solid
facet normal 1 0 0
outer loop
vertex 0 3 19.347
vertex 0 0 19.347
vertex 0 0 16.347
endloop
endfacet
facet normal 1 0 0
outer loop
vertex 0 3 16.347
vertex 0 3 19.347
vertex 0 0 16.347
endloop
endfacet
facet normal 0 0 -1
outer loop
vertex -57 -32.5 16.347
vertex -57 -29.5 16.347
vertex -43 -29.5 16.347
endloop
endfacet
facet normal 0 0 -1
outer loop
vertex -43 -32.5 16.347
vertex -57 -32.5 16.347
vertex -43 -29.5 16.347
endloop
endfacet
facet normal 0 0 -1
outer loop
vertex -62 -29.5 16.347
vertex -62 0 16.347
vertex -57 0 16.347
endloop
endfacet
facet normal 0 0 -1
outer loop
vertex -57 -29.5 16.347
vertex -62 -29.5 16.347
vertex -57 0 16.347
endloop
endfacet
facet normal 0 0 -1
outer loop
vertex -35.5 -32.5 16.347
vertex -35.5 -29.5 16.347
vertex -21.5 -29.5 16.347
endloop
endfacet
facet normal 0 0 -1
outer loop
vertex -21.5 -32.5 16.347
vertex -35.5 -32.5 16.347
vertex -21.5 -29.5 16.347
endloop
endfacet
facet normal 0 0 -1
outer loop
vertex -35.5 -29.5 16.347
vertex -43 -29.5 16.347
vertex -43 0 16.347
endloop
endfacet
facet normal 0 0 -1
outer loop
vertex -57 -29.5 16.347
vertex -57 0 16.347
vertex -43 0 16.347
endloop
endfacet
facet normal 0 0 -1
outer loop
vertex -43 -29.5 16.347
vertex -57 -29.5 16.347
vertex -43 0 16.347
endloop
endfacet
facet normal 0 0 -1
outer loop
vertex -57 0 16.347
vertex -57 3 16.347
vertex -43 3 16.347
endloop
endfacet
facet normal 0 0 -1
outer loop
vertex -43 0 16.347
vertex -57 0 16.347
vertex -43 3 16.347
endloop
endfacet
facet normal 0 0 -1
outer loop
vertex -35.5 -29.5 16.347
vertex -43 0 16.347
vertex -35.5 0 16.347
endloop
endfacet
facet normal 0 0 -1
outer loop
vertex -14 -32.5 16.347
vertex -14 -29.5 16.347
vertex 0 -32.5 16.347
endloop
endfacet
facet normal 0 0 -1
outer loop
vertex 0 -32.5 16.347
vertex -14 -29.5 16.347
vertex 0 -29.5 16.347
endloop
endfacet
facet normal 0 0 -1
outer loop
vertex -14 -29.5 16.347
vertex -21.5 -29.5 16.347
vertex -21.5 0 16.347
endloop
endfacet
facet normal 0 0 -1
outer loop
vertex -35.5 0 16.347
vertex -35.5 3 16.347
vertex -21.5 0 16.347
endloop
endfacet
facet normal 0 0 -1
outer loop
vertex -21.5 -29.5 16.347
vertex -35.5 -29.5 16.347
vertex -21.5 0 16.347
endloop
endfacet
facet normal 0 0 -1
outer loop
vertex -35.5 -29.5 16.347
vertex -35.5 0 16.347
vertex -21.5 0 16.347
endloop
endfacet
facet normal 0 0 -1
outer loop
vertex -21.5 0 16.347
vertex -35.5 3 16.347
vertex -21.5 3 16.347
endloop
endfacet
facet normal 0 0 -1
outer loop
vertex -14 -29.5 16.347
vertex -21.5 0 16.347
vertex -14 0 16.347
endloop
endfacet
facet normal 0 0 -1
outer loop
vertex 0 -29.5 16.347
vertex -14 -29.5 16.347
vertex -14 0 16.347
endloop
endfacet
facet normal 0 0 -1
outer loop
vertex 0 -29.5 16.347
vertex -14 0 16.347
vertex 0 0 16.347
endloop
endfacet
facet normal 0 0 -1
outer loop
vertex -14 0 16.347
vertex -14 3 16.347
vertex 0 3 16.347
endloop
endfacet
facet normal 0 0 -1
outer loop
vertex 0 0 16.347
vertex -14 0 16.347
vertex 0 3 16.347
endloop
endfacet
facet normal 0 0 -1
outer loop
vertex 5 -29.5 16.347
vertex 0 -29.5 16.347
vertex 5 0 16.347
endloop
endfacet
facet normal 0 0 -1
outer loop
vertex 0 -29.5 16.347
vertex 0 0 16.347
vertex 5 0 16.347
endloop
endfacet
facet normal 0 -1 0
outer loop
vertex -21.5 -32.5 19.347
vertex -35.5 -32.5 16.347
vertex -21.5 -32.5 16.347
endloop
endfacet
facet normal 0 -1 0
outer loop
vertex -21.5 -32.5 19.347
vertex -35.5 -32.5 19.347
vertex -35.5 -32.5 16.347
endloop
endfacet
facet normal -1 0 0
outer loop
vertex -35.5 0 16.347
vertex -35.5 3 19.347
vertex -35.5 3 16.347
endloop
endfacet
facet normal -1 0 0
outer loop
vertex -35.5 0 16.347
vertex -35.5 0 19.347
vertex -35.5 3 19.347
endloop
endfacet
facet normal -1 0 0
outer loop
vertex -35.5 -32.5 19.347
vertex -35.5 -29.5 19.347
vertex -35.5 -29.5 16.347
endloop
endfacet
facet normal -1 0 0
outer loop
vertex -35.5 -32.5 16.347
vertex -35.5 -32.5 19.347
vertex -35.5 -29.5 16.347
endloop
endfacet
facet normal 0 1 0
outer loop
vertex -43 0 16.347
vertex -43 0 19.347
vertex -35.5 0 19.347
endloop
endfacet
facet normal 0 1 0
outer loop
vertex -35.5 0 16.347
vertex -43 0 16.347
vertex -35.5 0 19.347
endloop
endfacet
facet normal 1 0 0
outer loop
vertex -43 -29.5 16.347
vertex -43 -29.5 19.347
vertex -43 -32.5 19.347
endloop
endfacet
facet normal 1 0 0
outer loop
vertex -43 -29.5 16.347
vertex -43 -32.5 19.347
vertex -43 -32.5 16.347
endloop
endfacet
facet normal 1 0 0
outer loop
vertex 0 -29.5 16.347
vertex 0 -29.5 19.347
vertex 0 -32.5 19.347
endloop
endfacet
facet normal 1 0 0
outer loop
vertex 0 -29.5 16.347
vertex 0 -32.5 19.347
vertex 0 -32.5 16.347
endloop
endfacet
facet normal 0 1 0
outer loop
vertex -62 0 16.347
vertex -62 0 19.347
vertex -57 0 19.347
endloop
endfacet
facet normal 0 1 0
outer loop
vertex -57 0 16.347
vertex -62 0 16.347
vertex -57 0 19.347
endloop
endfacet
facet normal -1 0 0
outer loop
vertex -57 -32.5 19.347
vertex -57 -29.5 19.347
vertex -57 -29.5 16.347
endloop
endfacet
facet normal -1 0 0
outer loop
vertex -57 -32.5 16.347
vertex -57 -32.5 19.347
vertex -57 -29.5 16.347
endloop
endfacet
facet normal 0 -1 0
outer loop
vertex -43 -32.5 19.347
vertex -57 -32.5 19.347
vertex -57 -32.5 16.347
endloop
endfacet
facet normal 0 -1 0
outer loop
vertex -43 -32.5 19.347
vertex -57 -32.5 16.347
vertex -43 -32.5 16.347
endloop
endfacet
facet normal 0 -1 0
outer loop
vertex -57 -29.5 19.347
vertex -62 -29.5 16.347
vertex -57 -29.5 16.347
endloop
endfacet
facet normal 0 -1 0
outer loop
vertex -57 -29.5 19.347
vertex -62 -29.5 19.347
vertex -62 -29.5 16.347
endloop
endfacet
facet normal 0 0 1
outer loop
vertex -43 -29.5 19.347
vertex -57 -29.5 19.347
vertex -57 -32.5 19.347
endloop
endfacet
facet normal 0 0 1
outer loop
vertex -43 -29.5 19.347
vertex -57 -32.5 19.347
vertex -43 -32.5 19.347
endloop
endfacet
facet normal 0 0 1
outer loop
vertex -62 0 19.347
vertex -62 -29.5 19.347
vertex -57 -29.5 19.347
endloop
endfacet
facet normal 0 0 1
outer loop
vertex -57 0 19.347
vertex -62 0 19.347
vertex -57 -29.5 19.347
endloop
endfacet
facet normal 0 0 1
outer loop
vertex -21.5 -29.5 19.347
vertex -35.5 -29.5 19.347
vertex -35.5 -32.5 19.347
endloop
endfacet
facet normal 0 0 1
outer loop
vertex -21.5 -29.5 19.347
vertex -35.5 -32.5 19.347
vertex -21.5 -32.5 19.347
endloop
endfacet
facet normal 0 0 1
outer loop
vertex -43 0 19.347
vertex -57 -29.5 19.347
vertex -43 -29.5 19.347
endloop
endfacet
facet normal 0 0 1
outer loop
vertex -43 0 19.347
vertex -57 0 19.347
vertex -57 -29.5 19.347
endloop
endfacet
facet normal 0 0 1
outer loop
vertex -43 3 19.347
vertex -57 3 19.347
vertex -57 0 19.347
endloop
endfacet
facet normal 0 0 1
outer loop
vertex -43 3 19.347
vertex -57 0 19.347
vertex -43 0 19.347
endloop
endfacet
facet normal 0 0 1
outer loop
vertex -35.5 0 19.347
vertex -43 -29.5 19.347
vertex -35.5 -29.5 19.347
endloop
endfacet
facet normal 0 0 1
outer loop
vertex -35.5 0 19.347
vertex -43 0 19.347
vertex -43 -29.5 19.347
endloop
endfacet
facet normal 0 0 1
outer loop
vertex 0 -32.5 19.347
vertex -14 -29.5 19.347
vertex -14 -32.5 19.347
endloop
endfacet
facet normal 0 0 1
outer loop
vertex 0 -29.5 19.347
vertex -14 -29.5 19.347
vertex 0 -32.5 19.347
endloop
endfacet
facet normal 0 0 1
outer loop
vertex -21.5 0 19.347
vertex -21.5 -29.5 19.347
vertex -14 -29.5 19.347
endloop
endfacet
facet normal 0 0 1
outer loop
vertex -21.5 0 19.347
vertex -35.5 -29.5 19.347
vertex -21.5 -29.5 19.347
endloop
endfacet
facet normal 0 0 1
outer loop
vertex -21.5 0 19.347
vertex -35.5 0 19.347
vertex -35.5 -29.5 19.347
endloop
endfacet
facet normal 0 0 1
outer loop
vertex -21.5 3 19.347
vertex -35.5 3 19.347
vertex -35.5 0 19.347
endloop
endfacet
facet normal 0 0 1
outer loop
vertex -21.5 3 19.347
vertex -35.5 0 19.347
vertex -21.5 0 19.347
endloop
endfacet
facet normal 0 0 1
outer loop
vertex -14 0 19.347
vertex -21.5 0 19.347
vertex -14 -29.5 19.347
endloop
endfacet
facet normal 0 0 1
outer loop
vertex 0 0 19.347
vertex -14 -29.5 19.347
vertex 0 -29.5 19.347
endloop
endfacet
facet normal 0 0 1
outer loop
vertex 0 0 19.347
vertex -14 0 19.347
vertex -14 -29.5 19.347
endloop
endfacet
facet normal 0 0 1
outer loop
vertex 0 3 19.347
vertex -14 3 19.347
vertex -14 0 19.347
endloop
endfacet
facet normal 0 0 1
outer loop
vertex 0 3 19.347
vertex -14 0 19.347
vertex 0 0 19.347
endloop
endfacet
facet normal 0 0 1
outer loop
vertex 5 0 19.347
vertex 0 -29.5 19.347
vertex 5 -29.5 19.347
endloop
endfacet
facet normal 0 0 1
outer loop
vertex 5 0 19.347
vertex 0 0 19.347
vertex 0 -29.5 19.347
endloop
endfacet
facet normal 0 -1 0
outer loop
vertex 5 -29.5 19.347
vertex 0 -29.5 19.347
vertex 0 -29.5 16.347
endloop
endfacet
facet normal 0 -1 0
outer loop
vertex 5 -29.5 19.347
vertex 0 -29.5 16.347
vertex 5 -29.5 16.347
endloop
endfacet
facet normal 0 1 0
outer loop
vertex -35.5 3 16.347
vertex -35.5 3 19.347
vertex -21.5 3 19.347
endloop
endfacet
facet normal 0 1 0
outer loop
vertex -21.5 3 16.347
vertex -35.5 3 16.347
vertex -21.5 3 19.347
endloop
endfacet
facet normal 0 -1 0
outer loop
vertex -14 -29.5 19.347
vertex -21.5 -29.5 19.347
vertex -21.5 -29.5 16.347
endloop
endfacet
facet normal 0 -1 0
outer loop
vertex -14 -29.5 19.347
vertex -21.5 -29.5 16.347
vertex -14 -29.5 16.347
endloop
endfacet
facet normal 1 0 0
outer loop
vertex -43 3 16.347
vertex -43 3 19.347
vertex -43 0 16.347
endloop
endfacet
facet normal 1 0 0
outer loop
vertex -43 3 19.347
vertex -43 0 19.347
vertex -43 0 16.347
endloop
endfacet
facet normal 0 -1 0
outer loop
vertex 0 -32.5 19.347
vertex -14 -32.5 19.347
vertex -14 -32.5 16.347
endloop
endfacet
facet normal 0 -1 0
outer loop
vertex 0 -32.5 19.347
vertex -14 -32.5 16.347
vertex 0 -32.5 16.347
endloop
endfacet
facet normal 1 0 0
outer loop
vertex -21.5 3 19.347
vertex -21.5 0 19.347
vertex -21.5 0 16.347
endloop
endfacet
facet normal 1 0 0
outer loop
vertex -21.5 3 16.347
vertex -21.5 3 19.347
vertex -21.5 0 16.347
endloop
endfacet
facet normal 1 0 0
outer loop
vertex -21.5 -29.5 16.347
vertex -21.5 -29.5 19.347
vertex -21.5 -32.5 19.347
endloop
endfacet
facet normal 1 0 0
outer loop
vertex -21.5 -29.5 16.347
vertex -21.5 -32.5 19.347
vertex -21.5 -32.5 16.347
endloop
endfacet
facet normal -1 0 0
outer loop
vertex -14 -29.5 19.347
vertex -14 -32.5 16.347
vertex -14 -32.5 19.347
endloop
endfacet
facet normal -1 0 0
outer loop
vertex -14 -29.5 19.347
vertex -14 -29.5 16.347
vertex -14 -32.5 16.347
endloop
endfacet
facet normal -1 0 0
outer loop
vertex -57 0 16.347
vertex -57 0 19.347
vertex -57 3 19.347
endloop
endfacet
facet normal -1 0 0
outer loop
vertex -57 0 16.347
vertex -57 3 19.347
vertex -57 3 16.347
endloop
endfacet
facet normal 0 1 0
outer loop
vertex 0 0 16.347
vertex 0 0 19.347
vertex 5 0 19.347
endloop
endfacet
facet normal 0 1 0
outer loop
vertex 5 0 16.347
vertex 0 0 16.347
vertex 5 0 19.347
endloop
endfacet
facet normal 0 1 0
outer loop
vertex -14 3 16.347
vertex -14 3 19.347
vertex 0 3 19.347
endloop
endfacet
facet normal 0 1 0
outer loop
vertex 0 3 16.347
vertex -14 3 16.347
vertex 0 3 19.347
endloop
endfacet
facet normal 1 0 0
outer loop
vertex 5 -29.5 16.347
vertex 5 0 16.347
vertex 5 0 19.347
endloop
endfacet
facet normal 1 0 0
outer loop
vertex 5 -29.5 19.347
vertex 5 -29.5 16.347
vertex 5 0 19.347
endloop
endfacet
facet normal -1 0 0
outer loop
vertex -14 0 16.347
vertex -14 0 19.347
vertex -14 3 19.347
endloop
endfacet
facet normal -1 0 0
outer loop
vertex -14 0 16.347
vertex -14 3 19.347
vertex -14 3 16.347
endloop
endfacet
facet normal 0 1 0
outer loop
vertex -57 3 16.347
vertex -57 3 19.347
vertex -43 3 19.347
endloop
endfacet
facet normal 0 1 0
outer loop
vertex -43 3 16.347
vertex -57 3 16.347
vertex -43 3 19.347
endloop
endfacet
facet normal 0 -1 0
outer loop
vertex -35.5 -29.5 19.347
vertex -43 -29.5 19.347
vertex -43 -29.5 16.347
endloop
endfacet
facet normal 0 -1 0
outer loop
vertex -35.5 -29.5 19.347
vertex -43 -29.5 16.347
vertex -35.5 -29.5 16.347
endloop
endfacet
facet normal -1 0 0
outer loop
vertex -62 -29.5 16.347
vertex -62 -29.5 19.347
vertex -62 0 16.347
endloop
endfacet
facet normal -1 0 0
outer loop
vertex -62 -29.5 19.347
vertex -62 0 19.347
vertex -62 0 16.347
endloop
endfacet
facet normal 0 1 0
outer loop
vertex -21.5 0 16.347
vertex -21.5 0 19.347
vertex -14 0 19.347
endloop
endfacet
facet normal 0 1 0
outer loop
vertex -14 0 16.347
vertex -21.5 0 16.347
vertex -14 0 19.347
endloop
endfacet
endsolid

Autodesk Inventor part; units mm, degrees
ref_plane "YZ Plane" through (0, 0, 0) normal (1, 0, 0) x (0, 1, 0)
ref_plane "XZ Plane" through (0, 0, 0) normal (0, 1, 0) x (-1, 0, 0)
ref_plane "XY Plane" through (0, 0, 0) normal (0, 0, 1) x (1, 0, 0)
sketch "Boceto1" plane through (0, 0, 0) normal (0, 1, 0) x (-1, 0, 0)
  circle A0 centre (28.5, 0) radius 1.5
  circle A1 centre (28.5, -8) radius 1.5
  circle A2 centre (28.5, 8) radius 1.5
  circle A3 centre (36.5, 0) radius 1.5
  circle A4 centre (20.5, 0) radius 1.5
  circle A5 centre (28.5, 0) radius 47.5
  line L0 (57, 33) -> (43, 33)
  line L1 (43, 33) -> (43, 30)
  line L2 (35.5, 30) -> (35.5, 33)
  line L3 (35.5, 33) -> (21.5, 33)
  line L4 (21.5, 33) -> (21.5, 30)
  line L5 (14, 30) -> (14, 33)
  line L6 (14, 33) -> (0, 33)
  line L7 (43, 30) -> (57, 30)
  line L8 (21.5, 30) -> (35.5, 30)
  line L9 (14, 30) -> (0, 30)
  line L10 (0, 30) -> (0, 33)
  line L11 (57, 33) -> (57, 30)
  line L12 (35.5, -30) -> (35.5, -33)
  line L13 (21.5, -30) -> (35.5, -30)
  line L14 (35.5, -33) -> (21.5, -33)
  line L15 (21.5, -33) -> (21.5, -30)
  line L16 (57, -33) -> (43, -33)
  line L17 (43, -33) -> (43, -30)
  line L18 (43, -30) -> (57, -30)
  line L19 (14, -30) -> (14, -33)
  line L20 (14, -30) -> (0, -30)
  line L21 (14, -33) -> (0, -33)
  line L22 (0, -30) -> (0, -33)
  line L23 (57, -33) -> (57, -30)
extrude "Extrusión1" add sketch "Boceto1" along normal blind 3
sketch "Boceto2" plane through (-28.5, 0, 0) normal (0, -1, 0) x (1, 0, 0)
  circle A0 centre (0, 0) radius 3.5
  point P0 (28.5, 0)
  dimension "d23" = 7
extrude "Extrusión2" cut sketch "Boceto2" against normal blind 10
sketch "Boceto3" plane through (-28.5, 0, 0) normal (0, -1, 0) x (1, 0, 0)
  circle A0 centre (0, 0) radius 4.5
  point P0 (28.5, 0)
  dimension "d26" = 9
extrude "Extrusión3" cut sketch "Boceto3" against normal blind 10
sketch "Boceto4" plane through (-28.5, 0, 0) normal (0, -1, 0) x (1, 0, 0)
  circle A0 centre (0, 0) radius 4.5 projected
  arc A1 (-38.8091, 27.388) -> (38.8091, 27.388) centre (0, 0) ccw
  line L0 (-28.5, 30) -> (-28.5, 33) projected
  line L1 (-28.5, 30) -> (-28.5, 33)
  line L2 (-28.5, 33) -> (28.5, 33)
  line L3 (28.5, 33) -> (28.5, 30)
  line L4 (-14.5, 30) -> (-28.5, 30) projected
  line L5 (28.5, 30) -> (-28.5, 30)
  line L6 (-28.5, 33) -> (-31.5138, 33)
  line L7 (-31.5138, 33) -> (-31.5138, 30)
  line L8 (-31.5138, 30) -> (-28.5, 30)
  circle A2 centre (0, 0) radius 47.5 projected
  line L9 (38.8091, 27.388) -> (-38.8091, 27.388)
  point P0 (28.5, 0)
extrude "Extrusión4" cut sketch "Boceto4" against normal blind 10 contours L9 A1
sketch "Boceto5" plane through (0, 0, 0) normal (0, -1, 0) x (1, 0, 0)
  arc A0 (10.3091, 27.388) -> (-67.3091, 27.388) centre (-28.5, 0) ccw projected
  arc A1 (10.3091, 27.388) -> (-67.3091, 27.388) centre (-28.5, 0) ccw
  line L0 (-57, 19.347) -> (-43, 19.347)
  line L1 (0, 19.347) -> (-14, 19.347)
  line L2 (-14, 19.347) -> (-14, 16.347)
  line L3 (-21.5, 16.347) -> (-35.5, 16.347)
  line L4 (-43, 16.347) -> (-57, 16.347)
  line L5 (-57, 19.347) -> (-57, 16.347)
  line L6 (-43, 19.347) -> (-43, 16.347)
  line L7 (-35.5, 19.347) -> (-35.5, 16.347)
  line L8 (-21.5, 19.347) -> (-21.5, 16.347)
  line L9 (-14, 16.347) -> (0, 16.347)
  line L10 (0, 19.347) -> (0, 16.347)
  line L11 (-35.5, 19.347) -> (-21.5, 19.347)
  point P0 (0, 0)
  point P1 (-57, 30)
  point P2 (-21.5, 30)
  point P3 (0, 30)
extrude "Extrusión5" add sketch "Boceto5" against normal blind 3
sketch "Boceto6" plane through (0, 0, 0) normal (0, -1, 0) x (1, 0, 0)
  arc A0 (10.3091, 27.388) -> (-67.3091, 27.388) centre (-28.5, 0) ccw projected
  arc A1 (10.3091, 27.388) -> (-67.3091, 27.388) centre (-28.5, 0) ccw
  line L0 (-67.3091, 27.388) -> (10.3091, 27.388)
  point P0 (0, 0)
extrude "Extrusión6" cut sketch "Boceto6" against normal blind 3
sketch "Boceto7" plane through (0, 0, 0) normal (0, -1, 0) x (1, 0, 0)
  line L0 (-57, 19.347) -> (-43, 19.347) projected
  line L1 (-57, 19.347) -> (-62, 19.347)
  line L2 (-62, 19.347) -> (-62, 16.347)
  line L3 (-62, 16.347) -> (5, 16.347)
  line L4 (5, 16.347) -> (5, 19.347)
  line L5 (5, 19.347) -> (-62, 19.347)
  point P0 (0, 0)
  dimension "d36" = 5
  dimension "d37" = 67
extrude "Extrusión7" add sketch "Boceto7" along normal blind 29.5
sketch "Boceto8" plane through (0, -29.5, 0) normal (0, -1, 0) x (1, 0, 0)
  line L0 (-57, 19.347) -> (-43, 19.347) projected
  line L1 (-43, 16.347) -> (-57, 16.347) projected
  line L2 (-57, 19.347) -> (-57, 16.347)
  line L3 (-57, 16.347) -> (-43, 16.347)
  line L4 (-43, 19.347) -> (-43, 16.347) projected
  line L5 (-43, 16.347) -> (-43, 19.347)
  line L6 (-43, 19.347) -> (-57, 19.347)
  line L7 (-35.5, 19.347) -> (-21.5, 19.347) projected
  line L8 (-35.5, 19.347) -> (-35.5, 16.347)
  line L9 (-62, 16.347) -> (5, 16.347) projected
  line L10 (-21.5, 19.347) -> (-21.5, 16.347) projected
  line L11 (-35.5, 16.347) -> (-21.5, 16.347)
  line L12 (-21.5, 16.347) -> (-21.5, 19.347)
  line L13 (-21.5, 19.347) -> (-35.5, 19.347)
  line L14 (-14, 19.347) -> (0, 19.347) projected
  line L15 (-14, 19.347) -> (0, 19.347)
  line L16 (0, 19.347) -> (0, 16.347)
  line L17 (0, 16.347) -> (-14, 16.347)
  line L18 (-14, 16.347) -> (-14, 19.347) projected
  line L19 (-14, 16.347) -> (-14, 19.347)
  point P0 (0, 0)
extrude "Extrusión8" add sketch "Boceto8" along normal blind 3
properties part number "base4"
